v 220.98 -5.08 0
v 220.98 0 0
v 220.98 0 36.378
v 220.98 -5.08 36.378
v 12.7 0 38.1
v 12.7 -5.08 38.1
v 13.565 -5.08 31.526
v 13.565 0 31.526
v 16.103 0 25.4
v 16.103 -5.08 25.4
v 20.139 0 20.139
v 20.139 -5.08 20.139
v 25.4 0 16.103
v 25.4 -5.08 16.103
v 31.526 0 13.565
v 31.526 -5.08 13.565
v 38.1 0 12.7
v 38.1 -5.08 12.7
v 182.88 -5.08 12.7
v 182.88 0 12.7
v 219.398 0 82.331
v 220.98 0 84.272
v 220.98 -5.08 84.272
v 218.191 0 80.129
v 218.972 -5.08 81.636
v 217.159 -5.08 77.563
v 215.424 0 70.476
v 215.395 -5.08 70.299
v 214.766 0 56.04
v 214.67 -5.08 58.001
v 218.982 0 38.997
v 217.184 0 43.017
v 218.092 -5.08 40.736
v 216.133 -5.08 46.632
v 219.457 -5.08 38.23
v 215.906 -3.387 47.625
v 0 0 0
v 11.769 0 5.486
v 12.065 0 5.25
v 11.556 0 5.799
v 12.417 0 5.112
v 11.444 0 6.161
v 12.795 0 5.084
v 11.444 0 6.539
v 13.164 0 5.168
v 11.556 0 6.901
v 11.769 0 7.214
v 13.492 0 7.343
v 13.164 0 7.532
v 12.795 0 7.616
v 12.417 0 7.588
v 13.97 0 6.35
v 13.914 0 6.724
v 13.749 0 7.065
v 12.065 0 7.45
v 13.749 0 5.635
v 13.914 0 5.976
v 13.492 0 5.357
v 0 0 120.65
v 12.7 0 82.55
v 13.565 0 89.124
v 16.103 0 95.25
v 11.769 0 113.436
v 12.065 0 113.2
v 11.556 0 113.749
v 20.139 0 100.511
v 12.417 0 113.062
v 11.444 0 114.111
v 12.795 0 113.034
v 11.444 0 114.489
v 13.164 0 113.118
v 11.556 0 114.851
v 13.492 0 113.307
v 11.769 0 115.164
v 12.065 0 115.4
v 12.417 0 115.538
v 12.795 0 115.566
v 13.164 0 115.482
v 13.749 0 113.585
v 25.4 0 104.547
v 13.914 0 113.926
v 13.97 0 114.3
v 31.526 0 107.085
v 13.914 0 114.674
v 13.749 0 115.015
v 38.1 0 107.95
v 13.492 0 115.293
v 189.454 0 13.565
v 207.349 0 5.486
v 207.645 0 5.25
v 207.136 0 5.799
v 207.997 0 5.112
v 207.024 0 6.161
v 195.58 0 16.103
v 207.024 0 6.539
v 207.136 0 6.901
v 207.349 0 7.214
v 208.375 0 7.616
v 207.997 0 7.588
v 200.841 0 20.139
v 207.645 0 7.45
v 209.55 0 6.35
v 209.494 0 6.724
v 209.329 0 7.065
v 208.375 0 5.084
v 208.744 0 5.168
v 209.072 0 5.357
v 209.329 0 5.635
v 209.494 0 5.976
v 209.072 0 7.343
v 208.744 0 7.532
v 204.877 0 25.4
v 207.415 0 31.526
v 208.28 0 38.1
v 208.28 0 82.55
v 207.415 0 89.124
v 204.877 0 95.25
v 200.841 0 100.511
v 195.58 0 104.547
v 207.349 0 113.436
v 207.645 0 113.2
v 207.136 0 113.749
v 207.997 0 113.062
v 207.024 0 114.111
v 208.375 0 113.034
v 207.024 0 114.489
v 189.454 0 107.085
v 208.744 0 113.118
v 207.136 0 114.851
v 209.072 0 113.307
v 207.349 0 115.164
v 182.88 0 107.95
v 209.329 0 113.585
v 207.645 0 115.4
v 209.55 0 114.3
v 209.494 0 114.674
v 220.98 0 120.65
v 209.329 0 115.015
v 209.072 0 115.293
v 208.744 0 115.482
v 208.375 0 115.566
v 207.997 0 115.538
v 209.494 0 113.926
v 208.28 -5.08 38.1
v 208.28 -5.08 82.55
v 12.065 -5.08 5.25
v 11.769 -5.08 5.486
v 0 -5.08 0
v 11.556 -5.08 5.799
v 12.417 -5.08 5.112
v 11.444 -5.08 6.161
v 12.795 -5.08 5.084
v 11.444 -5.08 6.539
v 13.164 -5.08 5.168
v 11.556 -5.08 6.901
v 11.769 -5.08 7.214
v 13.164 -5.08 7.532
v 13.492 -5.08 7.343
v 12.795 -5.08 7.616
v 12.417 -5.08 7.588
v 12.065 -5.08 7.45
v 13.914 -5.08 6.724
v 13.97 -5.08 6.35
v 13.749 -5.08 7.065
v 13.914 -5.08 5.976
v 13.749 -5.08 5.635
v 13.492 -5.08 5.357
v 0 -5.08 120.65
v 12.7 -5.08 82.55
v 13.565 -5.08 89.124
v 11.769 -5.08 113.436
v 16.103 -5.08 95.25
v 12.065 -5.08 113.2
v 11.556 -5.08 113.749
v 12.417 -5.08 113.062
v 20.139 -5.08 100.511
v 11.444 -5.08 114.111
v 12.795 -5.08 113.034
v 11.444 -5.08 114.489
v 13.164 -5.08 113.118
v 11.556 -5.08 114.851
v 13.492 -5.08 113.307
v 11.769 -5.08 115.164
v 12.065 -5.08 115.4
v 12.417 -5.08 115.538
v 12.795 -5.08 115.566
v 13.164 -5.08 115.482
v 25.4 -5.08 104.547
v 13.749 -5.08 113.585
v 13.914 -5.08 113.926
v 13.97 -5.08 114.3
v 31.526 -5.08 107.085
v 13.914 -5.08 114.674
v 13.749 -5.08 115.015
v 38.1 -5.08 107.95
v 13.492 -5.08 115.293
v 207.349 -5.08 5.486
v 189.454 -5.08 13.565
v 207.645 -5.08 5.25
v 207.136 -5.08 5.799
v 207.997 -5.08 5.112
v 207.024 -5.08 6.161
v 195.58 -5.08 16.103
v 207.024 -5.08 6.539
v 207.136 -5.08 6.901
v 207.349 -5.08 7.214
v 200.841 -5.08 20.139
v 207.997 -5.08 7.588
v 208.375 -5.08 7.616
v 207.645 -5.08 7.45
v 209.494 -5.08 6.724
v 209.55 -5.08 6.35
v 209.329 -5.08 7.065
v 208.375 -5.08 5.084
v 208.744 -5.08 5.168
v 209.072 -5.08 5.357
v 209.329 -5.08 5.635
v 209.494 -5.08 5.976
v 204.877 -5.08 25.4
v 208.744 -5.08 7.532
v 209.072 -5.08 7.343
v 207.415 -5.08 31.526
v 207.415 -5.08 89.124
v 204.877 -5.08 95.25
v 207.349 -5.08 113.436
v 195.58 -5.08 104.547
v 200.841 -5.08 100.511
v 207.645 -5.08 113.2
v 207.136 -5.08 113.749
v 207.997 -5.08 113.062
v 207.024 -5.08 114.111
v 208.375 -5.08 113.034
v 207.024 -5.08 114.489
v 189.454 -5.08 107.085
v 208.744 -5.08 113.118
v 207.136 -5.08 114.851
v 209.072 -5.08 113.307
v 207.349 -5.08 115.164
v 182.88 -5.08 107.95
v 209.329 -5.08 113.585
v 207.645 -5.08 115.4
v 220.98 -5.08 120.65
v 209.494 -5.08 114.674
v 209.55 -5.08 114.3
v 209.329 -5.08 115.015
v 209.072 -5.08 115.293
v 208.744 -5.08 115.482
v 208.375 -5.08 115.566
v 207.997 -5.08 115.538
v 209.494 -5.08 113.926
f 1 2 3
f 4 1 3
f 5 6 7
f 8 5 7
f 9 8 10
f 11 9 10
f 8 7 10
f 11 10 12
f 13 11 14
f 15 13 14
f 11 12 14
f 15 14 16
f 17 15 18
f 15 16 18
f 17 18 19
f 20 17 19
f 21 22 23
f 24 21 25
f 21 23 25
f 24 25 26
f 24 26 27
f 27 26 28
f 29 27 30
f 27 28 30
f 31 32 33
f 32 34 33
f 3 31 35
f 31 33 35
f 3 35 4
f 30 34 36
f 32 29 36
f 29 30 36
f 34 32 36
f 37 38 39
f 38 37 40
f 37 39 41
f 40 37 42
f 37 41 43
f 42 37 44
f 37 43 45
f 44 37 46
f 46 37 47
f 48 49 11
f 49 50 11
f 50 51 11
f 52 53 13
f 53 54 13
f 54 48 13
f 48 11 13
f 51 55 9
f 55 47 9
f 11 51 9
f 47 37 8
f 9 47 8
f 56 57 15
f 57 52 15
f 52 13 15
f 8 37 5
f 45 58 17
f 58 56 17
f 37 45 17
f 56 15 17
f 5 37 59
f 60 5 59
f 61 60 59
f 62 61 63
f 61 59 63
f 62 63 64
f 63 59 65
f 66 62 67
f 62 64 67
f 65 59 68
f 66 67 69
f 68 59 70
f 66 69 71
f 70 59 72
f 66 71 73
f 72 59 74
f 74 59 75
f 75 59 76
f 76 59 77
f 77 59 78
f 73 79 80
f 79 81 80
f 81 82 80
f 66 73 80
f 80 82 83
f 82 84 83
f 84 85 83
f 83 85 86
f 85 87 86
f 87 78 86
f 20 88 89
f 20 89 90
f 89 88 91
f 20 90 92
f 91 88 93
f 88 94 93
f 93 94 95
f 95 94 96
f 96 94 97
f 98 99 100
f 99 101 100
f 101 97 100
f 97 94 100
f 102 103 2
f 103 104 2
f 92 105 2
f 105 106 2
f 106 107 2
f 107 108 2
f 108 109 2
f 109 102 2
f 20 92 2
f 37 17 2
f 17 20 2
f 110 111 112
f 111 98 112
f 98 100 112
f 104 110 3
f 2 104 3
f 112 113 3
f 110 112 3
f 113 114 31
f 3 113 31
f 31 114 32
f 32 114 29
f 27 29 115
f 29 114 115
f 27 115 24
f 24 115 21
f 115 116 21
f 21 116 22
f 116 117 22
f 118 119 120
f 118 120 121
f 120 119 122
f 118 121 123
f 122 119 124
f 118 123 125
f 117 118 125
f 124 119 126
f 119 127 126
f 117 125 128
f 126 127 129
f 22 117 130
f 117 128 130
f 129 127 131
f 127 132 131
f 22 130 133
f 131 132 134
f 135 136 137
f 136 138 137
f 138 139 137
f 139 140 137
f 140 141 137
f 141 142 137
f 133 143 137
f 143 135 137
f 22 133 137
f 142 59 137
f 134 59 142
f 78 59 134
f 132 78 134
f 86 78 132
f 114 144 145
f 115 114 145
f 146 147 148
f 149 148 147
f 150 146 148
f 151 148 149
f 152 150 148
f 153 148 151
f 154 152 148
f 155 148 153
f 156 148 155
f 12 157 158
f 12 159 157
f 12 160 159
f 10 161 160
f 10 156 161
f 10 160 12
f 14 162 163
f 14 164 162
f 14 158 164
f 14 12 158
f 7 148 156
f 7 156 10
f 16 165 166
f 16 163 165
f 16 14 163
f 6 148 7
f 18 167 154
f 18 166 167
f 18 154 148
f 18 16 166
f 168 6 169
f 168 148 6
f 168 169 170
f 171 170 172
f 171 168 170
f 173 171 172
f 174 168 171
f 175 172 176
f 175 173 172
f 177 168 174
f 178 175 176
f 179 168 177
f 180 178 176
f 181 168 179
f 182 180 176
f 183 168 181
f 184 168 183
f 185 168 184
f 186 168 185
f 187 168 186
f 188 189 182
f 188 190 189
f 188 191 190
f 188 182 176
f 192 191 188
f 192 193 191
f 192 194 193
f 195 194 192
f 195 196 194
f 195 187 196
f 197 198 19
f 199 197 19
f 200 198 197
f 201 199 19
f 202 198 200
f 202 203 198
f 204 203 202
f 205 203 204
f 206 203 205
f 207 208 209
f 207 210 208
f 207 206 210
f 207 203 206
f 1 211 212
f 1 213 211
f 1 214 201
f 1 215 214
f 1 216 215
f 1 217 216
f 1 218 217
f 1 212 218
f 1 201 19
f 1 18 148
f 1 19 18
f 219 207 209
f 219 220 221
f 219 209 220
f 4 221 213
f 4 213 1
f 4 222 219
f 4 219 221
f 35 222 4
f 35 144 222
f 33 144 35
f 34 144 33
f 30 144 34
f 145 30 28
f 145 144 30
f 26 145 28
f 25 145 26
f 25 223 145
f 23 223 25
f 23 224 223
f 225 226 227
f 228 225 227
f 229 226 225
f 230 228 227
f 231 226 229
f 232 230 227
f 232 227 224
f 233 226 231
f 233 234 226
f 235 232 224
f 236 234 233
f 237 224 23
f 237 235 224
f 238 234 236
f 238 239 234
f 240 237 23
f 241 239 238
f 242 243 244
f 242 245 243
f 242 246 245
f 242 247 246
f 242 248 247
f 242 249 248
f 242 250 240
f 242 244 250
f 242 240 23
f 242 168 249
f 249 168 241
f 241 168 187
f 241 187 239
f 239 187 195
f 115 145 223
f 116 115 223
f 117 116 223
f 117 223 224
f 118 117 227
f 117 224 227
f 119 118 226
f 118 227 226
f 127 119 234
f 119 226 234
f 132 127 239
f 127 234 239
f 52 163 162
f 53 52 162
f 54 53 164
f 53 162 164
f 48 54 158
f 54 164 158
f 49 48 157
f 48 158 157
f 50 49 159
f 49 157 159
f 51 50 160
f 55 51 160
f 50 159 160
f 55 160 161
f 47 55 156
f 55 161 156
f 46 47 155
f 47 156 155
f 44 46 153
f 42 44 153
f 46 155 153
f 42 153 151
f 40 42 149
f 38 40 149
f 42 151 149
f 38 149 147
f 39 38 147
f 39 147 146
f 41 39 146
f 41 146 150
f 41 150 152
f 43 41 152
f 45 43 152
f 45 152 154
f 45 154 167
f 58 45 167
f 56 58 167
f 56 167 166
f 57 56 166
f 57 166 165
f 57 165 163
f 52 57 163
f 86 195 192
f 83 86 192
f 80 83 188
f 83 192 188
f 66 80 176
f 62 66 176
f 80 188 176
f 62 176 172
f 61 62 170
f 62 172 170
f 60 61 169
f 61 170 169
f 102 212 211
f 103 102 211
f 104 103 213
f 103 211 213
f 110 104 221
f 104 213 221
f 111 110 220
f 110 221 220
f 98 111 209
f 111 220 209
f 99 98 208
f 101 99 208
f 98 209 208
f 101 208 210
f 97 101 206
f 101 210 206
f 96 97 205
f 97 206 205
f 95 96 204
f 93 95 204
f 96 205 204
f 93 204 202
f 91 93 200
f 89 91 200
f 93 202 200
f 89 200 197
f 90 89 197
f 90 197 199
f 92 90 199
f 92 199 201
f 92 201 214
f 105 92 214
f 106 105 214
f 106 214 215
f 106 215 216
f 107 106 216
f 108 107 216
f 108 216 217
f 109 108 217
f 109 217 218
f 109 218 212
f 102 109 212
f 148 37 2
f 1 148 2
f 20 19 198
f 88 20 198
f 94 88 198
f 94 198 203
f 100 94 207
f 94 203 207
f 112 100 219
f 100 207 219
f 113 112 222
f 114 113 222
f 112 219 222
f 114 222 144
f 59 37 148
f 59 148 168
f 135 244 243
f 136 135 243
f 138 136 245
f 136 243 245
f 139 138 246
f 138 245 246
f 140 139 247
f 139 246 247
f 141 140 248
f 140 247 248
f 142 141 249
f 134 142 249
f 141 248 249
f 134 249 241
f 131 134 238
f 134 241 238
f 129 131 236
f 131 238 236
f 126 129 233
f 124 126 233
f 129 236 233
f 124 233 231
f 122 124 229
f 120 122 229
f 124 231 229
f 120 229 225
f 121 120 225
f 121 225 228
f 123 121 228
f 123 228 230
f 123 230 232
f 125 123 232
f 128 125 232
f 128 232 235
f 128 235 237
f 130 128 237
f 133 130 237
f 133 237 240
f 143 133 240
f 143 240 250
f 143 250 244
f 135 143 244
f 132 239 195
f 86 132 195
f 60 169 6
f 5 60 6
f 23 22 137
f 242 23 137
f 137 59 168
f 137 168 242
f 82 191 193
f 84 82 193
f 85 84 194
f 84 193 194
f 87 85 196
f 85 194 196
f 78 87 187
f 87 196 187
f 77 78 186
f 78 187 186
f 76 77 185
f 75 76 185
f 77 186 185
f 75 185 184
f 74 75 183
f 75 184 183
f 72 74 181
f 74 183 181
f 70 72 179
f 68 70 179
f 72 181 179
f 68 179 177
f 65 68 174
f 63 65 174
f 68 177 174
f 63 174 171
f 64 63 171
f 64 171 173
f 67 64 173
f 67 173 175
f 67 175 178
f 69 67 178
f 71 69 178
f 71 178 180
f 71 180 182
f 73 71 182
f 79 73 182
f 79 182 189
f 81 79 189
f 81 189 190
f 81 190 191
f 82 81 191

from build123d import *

# Parameters (mm, degrees)
F0_W     = 220.98
F0_H     = 120.65
F1_DEPTH = 5.08
F3_DEPTH = 5.081
F4_R     = 1.27
F5_DEPTH = 5.081


with BuildPart() as f1:
    # F0 (on Front) → F1 (new body)
    with BuildSketch(Plane.XZ):
        with Locations((110.49, 60.325)):
            Rectangle(F0_W, F0_H)
    extrude(amount=F1_DEPTH)

    # F2 (on face) → F3 (cut, through all)
    with BuildSketch(Plane.XZ.offset(5.08)):
        with BuildLine():
            Line((12.7, 82.55), (12.7, 38.1))
            ThreePointArc((12.7, 38.1), (20.139488, 20.139488), (38.1, 12.7))
            Line((38.1, 12.7), (182.88, 12.7))
            ThreePointArc((182.88, 12.7), (200.840512, 20.139488), (208.28, 38.1))
            Line((208.28, 38.1), (208.28, 82.55))
            ThreePointArc((208.28, 82.55), (200.840512, 100.510512), (182.88, 107.95))
            Line((182.88, 107.95), (38.1, 107.95))
            ThreePointArc((38.1, 107.95), (20.139488, 100.510512), (12.7, 82.55))
        make_face()
    extrude(amount=-F3_DEPTH, mode=Mode.SUBTRACT)

    # F4 (on face) → F5 (cut, through all)
    with BuildSketch(Plane.XZ.offset(5.08)):
        with Locations((12.7, 114.3)):
            Circle(F4_R)
        with Locations((12.7, 6.35)):
            Circle(F4_R)
        with Locations((208.28, 114.3)):
            Circle(F4_R)
        with Locations((208.28, 6.35)):
            Circle(F4_R)
        with BuildLine():
            add(Edge.make_bspline(
                [(224.155, 85.725), (207.657216, 85.725), (215.906108, 47.625), (224.155, 9.525), (232.403892, 47.625), (240.652784, 85.725), (224.155, 85.725)],
                knots=[0, 0, 0, 2.094395, 2.094395, 4.18879, 4.18879, 6.283185, 6.283185, 6.283185], degree=2, weights=[1, 0.5, 1, 0.5, 1, 0.5, 1]))
        make_face()
    extrude(amount=-F5_DEPTH, mode=Mode.SUBTRACT)


solid = f1.part
